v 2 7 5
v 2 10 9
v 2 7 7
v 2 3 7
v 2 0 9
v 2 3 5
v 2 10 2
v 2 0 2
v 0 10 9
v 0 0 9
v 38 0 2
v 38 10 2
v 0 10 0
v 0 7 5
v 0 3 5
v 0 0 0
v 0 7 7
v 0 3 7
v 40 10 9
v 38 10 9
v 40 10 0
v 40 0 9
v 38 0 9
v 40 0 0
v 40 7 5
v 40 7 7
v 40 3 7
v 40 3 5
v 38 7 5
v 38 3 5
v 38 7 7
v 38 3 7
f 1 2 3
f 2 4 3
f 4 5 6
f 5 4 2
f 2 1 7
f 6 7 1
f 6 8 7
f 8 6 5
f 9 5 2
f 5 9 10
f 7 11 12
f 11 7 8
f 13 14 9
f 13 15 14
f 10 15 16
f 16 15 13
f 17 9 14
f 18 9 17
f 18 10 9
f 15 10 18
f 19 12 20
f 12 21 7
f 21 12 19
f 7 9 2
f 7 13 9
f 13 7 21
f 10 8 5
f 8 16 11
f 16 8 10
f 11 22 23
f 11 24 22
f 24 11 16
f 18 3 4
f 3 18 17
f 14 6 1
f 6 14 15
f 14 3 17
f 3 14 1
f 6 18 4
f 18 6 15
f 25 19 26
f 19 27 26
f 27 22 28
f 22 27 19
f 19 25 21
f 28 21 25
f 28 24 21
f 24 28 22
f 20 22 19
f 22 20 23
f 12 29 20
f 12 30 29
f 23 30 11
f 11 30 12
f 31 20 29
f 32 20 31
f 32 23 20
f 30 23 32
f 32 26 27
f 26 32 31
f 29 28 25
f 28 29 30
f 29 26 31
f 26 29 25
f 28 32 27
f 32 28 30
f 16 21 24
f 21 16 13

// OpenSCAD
wall = 2;
width = 36;
$fn=50;

module side() {
    translate([0,0,wall]) {
        difference(){
            cube(size=[wall,10,7]);
            translate([0,3,3])
                cube(size=[wall,4,2]);
        }
    }
}


cube(size=[width + 2* wall, 10, wall]);

side();
translate([width+wall,0,0])
    side();

 
